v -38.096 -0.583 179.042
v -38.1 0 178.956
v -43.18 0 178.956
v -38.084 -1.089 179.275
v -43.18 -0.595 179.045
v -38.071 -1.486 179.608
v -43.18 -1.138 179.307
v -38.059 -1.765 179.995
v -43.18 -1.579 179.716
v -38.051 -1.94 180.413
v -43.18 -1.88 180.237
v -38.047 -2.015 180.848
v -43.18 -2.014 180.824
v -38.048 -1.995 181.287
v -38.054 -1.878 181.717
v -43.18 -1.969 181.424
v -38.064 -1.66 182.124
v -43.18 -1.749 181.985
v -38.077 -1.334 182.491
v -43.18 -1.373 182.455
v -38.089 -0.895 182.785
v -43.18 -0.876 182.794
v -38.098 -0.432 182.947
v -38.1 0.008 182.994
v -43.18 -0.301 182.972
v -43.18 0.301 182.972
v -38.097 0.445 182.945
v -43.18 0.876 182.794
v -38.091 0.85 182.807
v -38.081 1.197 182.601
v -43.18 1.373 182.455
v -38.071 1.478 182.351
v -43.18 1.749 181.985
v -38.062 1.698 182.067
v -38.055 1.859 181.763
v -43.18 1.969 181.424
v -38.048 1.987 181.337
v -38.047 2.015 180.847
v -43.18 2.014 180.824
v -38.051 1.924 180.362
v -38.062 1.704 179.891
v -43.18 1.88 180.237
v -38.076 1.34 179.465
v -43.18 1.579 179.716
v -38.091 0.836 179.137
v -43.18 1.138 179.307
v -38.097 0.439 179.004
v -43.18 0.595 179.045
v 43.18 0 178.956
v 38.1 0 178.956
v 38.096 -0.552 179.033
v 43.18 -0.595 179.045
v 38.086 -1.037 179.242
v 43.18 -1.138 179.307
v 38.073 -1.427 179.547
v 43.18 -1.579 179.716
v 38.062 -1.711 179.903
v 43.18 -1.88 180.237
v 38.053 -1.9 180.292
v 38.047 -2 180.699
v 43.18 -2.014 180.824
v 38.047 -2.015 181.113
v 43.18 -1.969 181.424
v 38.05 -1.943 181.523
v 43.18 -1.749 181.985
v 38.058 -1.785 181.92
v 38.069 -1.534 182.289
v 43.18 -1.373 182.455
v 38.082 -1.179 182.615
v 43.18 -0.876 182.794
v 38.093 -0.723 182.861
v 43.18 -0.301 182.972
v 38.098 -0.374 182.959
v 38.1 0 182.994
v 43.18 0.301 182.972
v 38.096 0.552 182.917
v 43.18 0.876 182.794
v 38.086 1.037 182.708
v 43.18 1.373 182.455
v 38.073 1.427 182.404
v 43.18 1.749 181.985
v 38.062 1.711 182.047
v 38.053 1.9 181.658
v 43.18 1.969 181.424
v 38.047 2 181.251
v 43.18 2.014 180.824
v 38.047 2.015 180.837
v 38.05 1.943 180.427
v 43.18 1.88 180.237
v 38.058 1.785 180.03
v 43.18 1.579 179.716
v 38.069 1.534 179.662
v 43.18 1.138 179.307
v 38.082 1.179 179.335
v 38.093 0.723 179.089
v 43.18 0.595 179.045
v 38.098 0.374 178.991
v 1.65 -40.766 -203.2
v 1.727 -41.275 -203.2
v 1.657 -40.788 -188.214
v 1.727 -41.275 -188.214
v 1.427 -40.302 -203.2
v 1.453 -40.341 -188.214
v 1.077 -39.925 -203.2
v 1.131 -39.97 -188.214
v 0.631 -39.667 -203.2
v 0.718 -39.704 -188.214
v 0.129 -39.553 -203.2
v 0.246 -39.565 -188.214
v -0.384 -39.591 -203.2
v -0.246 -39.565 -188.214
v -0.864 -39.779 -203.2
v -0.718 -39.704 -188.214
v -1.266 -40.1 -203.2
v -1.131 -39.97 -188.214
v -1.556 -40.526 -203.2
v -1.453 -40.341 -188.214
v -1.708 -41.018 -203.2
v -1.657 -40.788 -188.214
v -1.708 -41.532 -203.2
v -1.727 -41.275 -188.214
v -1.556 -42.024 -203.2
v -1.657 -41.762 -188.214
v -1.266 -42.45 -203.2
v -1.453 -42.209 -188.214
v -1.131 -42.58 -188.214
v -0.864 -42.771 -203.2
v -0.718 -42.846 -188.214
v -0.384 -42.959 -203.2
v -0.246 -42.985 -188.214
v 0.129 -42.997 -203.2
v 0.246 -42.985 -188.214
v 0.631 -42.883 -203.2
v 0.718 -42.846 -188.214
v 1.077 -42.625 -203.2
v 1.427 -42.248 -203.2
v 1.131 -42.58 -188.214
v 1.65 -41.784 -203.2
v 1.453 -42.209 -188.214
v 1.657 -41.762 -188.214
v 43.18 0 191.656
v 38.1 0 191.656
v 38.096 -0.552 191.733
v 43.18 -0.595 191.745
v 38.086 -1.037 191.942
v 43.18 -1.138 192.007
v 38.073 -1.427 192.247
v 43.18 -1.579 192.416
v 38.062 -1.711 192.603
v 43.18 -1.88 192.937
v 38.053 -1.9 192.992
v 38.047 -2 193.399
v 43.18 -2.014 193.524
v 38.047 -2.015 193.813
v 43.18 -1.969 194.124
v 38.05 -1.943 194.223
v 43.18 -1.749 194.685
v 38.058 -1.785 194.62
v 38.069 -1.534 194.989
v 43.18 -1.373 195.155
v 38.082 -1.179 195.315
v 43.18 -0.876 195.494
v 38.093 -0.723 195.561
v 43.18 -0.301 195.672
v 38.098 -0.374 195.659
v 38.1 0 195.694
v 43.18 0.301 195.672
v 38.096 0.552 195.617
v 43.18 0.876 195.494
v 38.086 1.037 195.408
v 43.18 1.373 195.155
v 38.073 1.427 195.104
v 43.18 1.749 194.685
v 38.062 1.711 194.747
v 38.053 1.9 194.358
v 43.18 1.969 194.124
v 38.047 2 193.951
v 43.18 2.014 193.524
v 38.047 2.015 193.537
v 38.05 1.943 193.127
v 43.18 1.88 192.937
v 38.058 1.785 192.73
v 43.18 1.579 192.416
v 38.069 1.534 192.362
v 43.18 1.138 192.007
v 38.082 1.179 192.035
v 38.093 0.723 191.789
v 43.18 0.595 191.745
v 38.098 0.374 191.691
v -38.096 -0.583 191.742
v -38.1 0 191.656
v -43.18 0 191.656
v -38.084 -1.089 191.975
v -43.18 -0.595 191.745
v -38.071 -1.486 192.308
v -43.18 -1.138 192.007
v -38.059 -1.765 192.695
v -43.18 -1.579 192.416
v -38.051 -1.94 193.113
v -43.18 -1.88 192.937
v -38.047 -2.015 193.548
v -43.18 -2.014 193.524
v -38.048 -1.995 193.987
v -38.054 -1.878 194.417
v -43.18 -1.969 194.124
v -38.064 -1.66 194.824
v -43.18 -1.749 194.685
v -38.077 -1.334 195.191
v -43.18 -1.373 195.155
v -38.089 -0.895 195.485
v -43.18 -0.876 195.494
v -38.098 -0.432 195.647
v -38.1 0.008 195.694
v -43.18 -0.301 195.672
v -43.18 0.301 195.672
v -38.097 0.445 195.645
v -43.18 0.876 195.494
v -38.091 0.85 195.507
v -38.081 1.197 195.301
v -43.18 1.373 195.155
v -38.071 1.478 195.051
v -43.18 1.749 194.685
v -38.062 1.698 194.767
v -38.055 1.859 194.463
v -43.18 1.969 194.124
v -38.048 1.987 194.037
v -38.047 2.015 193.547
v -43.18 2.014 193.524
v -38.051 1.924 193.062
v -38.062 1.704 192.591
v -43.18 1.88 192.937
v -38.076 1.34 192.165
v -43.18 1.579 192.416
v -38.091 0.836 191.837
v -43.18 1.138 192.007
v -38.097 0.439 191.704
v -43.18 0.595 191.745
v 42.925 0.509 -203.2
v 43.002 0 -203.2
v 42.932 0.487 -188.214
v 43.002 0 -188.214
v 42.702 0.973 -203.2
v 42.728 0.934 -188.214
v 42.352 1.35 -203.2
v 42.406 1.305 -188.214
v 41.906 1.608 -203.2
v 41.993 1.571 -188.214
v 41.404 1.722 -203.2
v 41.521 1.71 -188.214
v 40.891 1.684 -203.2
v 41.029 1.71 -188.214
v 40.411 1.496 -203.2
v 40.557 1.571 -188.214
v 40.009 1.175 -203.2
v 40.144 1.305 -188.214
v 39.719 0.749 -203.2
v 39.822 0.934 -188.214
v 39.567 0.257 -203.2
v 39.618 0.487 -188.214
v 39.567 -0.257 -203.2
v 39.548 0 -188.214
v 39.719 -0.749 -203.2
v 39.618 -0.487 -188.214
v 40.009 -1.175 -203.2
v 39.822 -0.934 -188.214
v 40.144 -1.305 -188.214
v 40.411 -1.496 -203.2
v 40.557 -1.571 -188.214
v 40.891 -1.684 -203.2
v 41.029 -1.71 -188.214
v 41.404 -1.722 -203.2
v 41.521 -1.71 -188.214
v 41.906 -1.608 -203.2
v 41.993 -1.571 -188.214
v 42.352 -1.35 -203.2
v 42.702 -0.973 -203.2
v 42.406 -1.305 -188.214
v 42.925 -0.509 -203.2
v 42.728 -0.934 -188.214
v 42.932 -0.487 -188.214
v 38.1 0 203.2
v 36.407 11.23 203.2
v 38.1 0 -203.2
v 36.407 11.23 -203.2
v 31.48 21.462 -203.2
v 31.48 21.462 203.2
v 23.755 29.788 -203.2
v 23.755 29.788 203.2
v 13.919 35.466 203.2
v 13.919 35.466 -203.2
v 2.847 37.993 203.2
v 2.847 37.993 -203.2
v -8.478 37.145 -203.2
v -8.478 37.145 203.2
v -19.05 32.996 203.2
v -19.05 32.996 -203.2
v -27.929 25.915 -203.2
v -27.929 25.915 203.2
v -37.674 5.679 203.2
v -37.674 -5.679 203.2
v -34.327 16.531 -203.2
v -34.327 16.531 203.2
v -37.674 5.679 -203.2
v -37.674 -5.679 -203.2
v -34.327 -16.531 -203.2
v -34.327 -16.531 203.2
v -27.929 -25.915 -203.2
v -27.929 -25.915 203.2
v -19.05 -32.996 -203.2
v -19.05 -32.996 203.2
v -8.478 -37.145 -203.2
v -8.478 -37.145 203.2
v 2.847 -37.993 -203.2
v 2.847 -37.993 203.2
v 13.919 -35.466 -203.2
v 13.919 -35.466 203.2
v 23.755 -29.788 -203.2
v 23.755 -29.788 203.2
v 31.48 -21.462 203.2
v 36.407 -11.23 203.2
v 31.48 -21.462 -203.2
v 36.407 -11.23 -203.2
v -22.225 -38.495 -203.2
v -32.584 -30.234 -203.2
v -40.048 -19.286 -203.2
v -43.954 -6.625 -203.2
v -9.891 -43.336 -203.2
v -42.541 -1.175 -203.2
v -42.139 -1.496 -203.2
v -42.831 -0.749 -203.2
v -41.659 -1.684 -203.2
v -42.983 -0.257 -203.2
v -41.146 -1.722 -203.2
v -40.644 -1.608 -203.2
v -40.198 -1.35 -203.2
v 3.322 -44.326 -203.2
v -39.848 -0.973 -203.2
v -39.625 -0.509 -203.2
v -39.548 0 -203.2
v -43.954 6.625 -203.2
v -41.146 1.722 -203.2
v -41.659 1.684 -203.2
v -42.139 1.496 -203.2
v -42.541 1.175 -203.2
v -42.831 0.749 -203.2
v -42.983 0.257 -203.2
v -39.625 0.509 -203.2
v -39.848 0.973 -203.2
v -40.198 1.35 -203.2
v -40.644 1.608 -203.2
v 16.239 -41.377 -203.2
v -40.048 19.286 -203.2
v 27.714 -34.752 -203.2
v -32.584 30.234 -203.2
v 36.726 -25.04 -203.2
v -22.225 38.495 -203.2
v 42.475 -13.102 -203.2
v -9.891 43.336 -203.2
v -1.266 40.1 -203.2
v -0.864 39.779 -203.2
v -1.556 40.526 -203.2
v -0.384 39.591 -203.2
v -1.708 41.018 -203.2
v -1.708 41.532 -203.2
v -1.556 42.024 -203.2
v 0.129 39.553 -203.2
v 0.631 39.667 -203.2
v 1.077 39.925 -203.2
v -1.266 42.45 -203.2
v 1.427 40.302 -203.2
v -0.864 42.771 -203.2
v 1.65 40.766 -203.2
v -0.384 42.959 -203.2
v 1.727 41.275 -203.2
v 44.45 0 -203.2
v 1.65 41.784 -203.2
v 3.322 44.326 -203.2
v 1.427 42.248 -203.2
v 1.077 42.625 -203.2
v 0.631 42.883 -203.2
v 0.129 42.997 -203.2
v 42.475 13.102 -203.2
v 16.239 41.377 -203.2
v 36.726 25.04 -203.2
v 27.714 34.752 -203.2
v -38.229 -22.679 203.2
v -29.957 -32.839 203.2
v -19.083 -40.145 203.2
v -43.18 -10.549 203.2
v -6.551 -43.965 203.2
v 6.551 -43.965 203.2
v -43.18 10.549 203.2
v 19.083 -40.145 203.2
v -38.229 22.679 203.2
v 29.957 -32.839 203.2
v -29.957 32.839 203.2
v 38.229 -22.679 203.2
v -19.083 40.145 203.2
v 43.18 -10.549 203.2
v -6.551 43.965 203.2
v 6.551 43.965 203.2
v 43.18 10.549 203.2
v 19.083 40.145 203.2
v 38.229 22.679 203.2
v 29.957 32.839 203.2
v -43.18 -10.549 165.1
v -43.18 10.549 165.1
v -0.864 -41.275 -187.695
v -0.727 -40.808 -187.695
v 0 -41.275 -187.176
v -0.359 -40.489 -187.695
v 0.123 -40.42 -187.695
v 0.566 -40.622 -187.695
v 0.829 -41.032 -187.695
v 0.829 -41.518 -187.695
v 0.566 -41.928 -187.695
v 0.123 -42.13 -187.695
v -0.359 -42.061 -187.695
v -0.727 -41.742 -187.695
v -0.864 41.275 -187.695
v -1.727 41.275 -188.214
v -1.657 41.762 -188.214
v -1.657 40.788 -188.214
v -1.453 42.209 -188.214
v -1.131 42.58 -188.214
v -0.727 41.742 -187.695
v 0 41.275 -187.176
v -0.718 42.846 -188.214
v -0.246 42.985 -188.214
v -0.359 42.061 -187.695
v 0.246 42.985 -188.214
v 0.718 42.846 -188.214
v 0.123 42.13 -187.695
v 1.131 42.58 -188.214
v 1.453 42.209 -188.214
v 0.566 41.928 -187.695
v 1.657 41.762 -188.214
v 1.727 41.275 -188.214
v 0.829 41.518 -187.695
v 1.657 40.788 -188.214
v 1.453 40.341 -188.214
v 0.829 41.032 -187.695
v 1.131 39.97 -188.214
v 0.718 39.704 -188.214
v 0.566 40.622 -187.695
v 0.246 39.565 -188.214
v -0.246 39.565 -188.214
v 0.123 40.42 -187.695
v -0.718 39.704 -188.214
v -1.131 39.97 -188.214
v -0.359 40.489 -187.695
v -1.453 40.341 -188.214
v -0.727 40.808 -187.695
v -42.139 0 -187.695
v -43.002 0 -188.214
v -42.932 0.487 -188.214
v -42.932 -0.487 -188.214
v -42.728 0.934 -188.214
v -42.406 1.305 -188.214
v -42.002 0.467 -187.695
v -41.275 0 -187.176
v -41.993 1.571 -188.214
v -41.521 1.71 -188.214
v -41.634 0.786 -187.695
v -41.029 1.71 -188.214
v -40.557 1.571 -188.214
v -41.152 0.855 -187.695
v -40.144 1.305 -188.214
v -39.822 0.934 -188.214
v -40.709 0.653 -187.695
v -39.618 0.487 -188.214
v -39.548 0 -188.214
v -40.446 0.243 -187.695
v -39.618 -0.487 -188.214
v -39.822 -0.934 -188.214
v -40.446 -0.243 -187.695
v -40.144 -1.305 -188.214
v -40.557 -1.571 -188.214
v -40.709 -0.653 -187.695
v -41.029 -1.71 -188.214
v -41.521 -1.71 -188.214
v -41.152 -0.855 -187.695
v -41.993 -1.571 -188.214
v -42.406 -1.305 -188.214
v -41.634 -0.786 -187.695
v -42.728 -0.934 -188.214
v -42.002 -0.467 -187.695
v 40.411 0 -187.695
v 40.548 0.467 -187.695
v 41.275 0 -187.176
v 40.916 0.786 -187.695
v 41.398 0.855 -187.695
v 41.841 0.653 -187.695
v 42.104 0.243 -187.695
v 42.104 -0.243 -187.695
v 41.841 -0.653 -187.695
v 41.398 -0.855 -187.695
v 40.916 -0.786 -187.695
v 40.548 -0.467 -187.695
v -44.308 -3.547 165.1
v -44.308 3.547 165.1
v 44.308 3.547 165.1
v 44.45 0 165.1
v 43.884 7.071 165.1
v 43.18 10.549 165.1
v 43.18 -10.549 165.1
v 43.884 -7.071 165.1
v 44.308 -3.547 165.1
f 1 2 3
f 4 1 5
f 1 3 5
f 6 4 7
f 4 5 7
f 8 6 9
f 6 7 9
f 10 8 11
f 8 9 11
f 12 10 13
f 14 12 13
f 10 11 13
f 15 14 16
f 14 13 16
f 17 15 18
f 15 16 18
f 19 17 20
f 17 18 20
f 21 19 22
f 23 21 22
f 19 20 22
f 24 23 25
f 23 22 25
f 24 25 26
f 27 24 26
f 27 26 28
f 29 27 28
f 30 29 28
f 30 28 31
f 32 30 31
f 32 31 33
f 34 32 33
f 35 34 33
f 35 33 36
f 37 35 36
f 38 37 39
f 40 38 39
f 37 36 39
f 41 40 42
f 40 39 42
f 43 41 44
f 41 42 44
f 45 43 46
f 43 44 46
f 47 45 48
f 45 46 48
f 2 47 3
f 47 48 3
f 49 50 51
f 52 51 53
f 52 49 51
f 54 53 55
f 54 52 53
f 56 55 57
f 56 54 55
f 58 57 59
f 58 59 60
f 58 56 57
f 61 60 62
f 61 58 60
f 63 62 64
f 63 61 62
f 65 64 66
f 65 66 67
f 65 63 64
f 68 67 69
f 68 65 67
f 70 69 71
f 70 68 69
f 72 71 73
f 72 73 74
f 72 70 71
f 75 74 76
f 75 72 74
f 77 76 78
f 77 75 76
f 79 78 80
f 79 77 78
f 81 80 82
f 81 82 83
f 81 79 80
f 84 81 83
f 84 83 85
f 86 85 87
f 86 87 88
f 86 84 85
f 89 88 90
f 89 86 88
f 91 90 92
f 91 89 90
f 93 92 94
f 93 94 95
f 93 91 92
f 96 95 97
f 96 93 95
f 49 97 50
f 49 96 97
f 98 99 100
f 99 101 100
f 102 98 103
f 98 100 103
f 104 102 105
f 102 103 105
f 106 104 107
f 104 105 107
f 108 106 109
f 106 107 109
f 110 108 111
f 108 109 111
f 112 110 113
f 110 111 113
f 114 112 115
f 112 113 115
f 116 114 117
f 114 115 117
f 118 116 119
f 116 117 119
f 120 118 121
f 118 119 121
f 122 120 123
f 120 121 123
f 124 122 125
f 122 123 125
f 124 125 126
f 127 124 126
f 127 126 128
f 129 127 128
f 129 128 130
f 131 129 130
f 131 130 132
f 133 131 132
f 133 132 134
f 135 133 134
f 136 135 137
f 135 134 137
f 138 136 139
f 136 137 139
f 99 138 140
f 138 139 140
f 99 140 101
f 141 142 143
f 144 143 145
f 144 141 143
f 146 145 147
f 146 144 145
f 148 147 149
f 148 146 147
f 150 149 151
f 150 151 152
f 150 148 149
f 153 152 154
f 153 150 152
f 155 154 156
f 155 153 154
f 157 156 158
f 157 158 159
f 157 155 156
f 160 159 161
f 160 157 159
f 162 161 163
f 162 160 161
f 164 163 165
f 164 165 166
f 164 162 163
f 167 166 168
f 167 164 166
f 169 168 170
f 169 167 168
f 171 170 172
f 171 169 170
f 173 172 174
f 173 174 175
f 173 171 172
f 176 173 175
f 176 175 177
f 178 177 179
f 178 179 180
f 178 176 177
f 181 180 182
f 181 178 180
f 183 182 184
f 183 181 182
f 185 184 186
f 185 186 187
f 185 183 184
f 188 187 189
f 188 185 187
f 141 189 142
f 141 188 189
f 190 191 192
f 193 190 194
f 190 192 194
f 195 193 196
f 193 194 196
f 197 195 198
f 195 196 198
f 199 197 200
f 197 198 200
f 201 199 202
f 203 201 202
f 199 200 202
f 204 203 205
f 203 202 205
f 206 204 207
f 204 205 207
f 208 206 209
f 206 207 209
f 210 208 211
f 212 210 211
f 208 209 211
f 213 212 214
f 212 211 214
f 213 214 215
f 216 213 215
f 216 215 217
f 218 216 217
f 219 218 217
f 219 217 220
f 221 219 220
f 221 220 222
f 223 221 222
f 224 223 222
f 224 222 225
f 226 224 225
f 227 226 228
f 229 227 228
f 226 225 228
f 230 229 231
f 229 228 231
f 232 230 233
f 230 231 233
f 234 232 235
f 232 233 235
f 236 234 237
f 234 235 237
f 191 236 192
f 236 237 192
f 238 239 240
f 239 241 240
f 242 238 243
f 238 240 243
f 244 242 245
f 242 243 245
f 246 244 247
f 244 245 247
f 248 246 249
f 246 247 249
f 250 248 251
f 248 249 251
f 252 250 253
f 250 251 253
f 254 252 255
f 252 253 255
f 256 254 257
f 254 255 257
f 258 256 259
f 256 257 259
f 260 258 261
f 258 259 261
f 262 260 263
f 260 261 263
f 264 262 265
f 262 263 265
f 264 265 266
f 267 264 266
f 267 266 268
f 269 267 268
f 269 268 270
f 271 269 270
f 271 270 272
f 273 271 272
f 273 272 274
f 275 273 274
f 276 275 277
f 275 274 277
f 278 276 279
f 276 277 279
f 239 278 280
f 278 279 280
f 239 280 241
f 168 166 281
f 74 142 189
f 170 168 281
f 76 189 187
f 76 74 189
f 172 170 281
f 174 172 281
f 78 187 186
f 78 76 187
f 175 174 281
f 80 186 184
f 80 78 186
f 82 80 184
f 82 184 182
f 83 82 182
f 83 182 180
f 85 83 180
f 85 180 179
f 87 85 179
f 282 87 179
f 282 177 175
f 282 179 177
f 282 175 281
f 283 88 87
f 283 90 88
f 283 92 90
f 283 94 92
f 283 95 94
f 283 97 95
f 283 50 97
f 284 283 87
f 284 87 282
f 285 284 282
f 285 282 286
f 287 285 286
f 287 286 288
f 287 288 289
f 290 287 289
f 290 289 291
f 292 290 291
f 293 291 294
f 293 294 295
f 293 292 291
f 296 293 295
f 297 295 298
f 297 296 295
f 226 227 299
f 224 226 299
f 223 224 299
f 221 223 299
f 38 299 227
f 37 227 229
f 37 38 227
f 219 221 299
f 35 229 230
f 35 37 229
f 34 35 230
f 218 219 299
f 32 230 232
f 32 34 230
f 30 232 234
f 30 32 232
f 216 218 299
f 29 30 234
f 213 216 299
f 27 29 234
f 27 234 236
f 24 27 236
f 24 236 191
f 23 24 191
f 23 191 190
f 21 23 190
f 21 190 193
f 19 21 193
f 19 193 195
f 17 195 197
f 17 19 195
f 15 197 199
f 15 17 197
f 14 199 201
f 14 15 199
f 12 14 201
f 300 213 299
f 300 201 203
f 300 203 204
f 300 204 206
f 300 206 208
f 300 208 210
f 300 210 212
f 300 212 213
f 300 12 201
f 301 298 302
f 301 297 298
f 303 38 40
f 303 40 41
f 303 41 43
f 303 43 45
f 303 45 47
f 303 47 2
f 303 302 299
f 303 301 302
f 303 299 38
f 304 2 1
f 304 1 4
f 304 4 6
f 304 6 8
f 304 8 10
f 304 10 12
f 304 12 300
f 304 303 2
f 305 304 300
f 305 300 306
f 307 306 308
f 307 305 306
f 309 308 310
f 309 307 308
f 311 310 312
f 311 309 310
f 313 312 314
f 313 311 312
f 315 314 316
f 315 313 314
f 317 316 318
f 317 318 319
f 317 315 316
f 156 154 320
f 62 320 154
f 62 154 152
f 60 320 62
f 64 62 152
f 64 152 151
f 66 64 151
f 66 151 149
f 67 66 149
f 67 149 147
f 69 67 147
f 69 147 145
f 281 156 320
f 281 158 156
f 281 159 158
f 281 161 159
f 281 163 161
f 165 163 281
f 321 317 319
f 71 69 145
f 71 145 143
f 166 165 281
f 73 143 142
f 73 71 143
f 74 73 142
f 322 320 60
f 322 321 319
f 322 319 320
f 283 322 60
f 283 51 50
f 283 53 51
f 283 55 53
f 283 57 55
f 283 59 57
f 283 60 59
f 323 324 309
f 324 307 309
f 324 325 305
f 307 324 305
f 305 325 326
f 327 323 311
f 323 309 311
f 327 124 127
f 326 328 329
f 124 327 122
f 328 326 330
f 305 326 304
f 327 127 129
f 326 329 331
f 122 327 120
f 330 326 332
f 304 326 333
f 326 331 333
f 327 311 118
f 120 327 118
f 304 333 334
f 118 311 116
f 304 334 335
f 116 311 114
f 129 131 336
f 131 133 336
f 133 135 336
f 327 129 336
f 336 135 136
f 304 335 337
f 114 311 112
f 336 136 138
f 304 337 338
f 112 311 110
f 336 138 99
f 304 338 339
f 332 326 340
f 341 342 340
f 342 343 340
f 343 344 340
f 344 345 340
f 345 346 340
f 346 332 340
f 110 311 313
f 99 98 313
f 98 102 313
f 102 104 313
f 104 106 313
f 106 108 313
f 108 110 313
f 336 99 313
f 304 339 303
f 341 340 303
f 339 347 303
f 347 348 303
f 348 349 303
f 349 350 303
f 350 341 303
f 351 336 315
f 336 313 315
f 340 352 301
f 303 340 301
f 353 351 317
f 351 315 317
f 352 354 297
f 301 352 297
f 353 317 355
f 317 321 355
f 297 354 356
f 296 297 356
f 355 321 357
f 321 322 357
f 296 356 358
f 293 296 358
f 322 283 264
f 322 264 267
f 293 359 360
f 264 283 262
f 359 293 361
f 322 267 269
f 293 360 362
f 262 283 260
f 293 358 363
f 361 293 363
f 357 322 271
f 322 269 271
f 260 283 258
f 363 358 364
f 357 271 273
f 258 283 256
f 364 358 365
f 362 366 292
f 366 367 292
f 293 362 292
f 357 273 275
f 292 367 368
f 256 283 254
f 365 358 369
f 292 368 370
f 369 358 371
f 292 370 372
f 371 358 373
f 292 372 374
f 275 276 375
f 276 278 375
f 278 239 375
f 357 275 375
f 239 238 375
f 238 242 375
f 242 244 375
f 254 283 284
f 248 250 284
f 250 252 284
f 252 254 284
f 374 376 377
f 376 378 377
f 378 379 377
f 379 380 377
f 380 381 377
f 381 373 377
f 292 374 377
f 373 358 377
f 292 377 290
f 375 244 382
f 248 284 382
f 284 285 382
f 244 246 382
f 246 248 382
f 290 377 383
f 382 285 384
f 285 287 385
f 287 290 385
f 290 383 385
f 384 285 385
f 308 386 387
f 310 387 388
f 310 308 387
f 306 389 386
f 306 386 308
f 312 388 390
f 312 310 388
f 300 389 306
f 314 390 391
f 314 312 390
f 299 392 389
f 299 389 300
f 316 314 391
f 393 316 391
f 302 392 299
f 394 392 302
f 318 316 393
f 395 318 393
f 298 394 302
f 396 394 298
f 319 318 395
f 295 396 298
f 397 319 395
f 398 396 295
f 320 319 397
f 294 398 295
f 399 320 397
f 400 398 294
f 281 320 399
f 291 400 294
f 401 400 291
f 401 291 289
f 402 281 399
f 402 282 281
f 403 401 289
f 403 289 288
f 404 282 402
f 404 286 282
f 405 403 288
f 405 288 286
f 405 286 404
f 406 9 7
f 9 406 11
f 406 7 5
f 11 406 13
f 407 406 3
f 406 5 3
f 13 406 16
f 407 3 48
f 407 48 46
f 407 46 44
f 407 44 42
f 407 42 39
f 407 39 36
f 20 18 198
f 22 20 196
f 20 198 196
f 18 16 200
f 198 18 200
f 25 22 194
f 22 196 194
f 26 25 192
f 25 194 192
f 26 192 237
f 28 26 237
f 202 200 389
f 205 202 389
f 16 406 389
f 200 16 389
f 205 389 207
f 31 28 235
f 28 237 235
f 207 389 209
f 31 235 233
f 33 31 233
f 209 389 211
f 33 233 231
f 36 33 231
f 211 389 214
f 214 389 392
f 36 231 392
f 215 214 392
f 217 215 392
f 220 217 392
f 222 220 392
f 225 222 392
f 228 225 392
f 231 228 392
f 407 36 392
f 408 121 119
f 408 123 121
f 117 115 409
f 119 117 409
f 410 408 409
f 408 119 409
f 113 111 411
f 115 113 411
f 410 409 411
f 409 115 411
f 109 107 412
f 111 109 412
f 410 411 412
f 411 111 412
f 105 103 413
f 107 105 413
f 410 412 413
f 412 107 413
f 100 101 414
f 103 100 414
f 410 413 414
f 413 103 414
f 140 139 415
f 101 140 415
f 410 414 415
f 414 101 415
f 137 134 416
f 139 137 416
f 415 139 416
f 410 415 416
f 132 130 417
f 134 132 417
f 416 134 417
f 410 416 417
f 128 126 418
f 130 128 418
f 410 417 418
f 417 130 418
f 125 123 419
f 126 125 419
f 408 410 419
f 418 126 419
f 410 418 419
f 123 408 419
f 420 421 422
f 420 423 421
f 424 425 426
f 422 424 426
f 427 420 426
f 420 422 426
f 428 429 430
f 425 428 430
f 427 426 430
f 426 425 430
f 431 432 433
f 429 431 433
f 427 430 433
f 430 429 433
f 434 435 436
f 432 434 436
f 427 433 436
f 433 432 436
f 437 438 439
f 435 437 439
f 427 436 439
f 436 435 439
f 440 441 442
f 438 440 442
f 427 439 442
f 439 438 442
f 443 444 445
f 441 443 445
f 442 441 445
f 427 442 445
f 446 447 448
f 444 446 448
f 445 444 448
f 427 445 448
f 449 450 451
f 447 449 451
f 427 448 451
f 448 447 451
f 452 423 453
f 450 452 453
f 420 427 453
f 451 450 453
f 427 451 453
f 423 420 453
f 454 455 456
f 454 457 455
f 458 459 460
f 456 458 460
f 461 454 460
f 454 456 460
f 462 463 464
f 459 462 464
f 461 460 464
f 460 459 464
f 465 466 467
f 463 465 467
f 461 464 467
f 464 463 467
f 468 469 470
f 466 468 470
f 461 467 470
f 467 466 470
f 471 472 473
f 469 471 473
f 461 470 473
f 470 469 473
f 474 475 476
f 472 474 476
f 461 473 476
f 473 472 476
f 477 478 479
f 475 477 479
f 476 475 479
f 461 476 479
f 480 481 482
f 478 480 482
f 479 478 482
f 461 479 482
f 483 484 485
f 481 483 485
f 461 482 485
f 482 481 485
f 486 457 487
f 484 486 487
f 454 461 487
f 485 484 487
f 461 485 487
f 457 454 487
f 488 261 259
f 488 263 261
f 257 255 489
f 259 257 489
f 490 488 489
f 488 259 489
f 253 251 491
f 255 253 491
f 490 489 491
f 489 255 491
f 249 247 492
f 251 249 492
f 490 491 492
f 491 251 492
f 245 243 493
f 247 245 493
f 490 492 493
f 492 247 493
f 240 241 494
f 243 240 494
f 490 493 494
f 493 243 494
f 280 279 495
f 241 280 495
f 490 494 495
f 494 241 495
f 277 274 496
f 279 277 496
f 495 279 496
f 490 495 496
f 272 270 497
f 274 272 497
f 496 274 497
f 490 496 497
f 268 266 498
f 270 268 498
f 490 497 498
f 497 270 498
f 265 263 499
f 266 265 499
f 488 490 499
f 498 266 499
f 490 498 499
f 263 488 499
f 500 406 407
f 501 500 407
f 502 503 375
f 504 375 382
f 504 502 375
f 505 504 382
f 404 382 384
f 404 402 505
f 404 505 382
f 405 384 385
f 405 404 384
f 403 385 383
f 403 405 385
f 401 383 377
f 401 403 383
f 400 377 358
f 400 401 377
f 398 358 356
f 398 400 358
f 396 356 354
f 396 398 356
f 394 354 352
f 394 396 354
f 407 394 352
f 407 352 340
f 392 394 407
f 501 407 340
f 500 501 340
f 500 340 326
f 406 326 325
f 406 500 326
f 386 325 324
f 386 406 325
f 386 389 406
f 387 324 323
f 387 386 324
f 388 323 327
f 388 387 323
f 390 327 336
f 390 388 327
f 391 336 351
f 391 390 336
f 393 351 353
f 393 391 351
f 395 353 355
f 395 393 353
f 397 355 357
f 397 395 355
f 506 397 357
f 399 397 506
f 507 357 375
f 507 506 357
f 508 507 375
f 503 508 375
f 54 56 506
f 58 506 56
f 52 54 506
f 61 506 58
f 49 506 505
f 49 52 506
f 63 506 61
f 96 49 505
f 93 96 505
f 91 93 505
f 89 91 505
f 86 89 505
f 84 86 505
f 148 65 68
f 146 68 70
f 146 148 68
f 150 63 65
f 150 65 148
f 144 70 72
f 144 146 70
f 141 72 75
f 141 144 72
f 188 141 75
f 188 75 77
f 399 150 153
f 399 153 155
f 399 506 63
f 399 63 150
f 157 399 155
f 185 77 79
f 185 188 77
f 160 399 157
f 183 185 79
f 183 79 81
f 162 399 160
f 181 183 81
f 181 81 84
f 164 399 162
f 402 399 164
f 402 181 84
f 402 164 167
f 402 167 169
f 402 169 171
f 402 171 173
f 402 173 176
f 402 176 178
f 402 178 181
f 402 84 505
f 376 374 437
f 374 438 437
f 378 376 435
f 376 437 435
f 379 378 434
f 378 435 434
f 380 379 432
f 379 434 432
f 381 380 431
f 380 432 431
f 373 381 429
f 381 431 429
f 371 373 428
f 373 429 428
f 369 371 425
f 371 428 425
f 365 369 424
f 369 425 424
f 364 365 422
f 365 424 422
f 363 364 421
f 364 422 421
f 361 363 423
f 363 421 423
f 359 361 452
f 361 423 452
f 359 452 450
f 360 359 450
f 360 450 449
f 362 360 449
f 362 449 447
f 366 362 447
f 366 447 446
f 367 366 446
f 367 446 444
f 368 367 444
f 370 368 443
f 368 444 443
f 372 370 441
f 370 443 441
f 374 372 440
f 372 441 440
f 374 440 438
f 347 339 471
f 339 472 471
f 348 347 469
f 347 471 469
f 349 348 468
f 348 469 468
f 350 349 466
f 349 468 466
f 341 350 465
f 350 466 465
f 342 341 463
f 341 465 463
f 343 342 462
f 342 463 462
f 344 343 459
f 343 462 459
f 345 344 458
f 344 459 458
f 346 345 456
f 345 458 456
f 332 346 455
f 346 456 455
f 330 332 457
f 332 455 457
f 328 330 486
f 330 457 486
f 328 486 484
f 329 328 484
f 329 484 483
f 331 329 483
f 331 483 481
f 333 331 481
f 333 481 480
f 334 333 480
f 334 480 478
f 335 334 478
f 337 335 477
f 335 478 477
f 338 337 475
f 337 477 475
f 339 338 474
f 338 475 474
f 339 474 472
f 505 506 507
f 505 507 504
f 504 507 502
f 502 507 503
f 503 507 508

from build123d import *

# Parameters (mm, degrees)
SKETCH1_R                       = 44.45
SKETCH1_R_2                     = 38.1
BOSS_EXTRUDE1_DEPTH             = 203.2
SKETCH2_W                       = 7.89975339
SKETCH2_H                       = 28.462346772
CUT_EXTRUDE1_DEPTH              = 38.1
F_10_32_TAPPED_HOLE1_AT_2_COUNT = 2
F_10_32_TAPPED_HOLE1_AT_2_PITCH = 12.7
F_8_32_TAPPED_HOLE1_D           = 3.4544
F_8_32_TAPPED_HOLE1_DEPTH       = 14.986
F_8_32_TAPPED_HOLE1_TIP         = 1.037806461


with BuildPart() as part:
    # Sketch1 → Boss-Extrude1 (new, symmetric)
    with BuildSketch(Plane.XY):
        Circle(SKETCH1_R)
        Circle(SKETCH1_R_2, mode=Mode.SUBTRACT)
    extrude(amount=BOSS_EXTRUDE1_DEPTH, both=True)

    # Sketch2 → Cut-Extrude1 (cut)
    with BuildSketch(Plane.XY.offset(203.2)):
        with Locations((47.129876695, -0.406604954)):
            Rectangle(SKETCH2_W, SKETCH2_H)
    cut_extrude1 = extrude(amount=-CUT_EXTRUDE1_DEPTH, mode=Mode.SUBTRACT)

    # Sketch3 → #10-32 Tapped Hole1 (revolve, cut)
    with BuildSketch(Plane(origin=(43.18, 0, 193.675), x_dir=(0, 0, -1), z_dir=(0, 1, 0))):
        Polygon((0, 0), (0, 14.929317848), (2.0193, 13.716), (2.0193, 0), align=None)
    f_10_32_tapped_hole1 = revolve(axis=Axis((49.53, 0, 193.675), (-1, 0, 0)), mode=Mode.SUBTRACT)

    # #10-32 Tapped Hole1 at 2: #10-32 Tapped Hole1 ×2
    with Locations(*[(0, 0, -i * F_10_32_TAPPED_HOLE1_AT_2_PITCH) for i in range(1, F_10_32_TAPPED_HOLE1_AT_2_COUNT)]):
        add(f_10_32_tapped_hole1, mode=Mode.SUBTRACT)

    # #8-32 Tapped Hole1
    with Locations(Plane(origin=(0, 0, -203.2), x_dir=(-1, 0, 0), z_dir=(0, 0, -1))):
        with Locations((0, 41.275), (-41.275, 0), (41.275, 0), (0, -41.275)):
            Hole(F_8_32_TAPPED_HOLE1_D / 2, depth=F_8_32_TAPPED_HOLE1_DEPTH)
            with Locations((0, 0, -(F_8_32_TAPPED_HOLE1_DEPTH + F_8_32_TAPPED_HOLE1_TIP / 2))):  # 118° drill point
                Cone(0, F_8_32_TAPPED_HOLE1_D / 2, F_8_32_TAPPED_HOLE1_TIP, mode=Mode.SUBTRACT)

    # Mirror1: Cut-Extrude1, #10-32 Tapped Hole1 across plane
    add(cut_extrude1.mirror(Plane(origin=(0, 0, 0), x_dir=(0, 0, 1), z_dir=(1, 0, 0))), mode=Mode.SUBTRACT)
    add(f_10_32_tapped_hole1.mirror(Plane(origin=(0, 0, 0), x_dir=(0, 0, 1), z_dir=(1, 0, 0))), mode=Mode.SUBTRACT)

    # Mirror1 copy 1 sketch → Mirror1 copy 1 (revolve, cut)
    with BuildSketch(Plane(origin=(-43.18, 0, 180.975), x_dir=(0, 0, -1), z_dir=(0, 1, 0))):
        Polygon((0, 0), (0, -14.929317848), (2.0193, -13.716), (2.0193, 0), align=None)
    revolve(axis=Axis((-49.53, 0, 180.975), (-1, 0, 0)), mode=Mode.SUBTRACT)


solid = part.part
